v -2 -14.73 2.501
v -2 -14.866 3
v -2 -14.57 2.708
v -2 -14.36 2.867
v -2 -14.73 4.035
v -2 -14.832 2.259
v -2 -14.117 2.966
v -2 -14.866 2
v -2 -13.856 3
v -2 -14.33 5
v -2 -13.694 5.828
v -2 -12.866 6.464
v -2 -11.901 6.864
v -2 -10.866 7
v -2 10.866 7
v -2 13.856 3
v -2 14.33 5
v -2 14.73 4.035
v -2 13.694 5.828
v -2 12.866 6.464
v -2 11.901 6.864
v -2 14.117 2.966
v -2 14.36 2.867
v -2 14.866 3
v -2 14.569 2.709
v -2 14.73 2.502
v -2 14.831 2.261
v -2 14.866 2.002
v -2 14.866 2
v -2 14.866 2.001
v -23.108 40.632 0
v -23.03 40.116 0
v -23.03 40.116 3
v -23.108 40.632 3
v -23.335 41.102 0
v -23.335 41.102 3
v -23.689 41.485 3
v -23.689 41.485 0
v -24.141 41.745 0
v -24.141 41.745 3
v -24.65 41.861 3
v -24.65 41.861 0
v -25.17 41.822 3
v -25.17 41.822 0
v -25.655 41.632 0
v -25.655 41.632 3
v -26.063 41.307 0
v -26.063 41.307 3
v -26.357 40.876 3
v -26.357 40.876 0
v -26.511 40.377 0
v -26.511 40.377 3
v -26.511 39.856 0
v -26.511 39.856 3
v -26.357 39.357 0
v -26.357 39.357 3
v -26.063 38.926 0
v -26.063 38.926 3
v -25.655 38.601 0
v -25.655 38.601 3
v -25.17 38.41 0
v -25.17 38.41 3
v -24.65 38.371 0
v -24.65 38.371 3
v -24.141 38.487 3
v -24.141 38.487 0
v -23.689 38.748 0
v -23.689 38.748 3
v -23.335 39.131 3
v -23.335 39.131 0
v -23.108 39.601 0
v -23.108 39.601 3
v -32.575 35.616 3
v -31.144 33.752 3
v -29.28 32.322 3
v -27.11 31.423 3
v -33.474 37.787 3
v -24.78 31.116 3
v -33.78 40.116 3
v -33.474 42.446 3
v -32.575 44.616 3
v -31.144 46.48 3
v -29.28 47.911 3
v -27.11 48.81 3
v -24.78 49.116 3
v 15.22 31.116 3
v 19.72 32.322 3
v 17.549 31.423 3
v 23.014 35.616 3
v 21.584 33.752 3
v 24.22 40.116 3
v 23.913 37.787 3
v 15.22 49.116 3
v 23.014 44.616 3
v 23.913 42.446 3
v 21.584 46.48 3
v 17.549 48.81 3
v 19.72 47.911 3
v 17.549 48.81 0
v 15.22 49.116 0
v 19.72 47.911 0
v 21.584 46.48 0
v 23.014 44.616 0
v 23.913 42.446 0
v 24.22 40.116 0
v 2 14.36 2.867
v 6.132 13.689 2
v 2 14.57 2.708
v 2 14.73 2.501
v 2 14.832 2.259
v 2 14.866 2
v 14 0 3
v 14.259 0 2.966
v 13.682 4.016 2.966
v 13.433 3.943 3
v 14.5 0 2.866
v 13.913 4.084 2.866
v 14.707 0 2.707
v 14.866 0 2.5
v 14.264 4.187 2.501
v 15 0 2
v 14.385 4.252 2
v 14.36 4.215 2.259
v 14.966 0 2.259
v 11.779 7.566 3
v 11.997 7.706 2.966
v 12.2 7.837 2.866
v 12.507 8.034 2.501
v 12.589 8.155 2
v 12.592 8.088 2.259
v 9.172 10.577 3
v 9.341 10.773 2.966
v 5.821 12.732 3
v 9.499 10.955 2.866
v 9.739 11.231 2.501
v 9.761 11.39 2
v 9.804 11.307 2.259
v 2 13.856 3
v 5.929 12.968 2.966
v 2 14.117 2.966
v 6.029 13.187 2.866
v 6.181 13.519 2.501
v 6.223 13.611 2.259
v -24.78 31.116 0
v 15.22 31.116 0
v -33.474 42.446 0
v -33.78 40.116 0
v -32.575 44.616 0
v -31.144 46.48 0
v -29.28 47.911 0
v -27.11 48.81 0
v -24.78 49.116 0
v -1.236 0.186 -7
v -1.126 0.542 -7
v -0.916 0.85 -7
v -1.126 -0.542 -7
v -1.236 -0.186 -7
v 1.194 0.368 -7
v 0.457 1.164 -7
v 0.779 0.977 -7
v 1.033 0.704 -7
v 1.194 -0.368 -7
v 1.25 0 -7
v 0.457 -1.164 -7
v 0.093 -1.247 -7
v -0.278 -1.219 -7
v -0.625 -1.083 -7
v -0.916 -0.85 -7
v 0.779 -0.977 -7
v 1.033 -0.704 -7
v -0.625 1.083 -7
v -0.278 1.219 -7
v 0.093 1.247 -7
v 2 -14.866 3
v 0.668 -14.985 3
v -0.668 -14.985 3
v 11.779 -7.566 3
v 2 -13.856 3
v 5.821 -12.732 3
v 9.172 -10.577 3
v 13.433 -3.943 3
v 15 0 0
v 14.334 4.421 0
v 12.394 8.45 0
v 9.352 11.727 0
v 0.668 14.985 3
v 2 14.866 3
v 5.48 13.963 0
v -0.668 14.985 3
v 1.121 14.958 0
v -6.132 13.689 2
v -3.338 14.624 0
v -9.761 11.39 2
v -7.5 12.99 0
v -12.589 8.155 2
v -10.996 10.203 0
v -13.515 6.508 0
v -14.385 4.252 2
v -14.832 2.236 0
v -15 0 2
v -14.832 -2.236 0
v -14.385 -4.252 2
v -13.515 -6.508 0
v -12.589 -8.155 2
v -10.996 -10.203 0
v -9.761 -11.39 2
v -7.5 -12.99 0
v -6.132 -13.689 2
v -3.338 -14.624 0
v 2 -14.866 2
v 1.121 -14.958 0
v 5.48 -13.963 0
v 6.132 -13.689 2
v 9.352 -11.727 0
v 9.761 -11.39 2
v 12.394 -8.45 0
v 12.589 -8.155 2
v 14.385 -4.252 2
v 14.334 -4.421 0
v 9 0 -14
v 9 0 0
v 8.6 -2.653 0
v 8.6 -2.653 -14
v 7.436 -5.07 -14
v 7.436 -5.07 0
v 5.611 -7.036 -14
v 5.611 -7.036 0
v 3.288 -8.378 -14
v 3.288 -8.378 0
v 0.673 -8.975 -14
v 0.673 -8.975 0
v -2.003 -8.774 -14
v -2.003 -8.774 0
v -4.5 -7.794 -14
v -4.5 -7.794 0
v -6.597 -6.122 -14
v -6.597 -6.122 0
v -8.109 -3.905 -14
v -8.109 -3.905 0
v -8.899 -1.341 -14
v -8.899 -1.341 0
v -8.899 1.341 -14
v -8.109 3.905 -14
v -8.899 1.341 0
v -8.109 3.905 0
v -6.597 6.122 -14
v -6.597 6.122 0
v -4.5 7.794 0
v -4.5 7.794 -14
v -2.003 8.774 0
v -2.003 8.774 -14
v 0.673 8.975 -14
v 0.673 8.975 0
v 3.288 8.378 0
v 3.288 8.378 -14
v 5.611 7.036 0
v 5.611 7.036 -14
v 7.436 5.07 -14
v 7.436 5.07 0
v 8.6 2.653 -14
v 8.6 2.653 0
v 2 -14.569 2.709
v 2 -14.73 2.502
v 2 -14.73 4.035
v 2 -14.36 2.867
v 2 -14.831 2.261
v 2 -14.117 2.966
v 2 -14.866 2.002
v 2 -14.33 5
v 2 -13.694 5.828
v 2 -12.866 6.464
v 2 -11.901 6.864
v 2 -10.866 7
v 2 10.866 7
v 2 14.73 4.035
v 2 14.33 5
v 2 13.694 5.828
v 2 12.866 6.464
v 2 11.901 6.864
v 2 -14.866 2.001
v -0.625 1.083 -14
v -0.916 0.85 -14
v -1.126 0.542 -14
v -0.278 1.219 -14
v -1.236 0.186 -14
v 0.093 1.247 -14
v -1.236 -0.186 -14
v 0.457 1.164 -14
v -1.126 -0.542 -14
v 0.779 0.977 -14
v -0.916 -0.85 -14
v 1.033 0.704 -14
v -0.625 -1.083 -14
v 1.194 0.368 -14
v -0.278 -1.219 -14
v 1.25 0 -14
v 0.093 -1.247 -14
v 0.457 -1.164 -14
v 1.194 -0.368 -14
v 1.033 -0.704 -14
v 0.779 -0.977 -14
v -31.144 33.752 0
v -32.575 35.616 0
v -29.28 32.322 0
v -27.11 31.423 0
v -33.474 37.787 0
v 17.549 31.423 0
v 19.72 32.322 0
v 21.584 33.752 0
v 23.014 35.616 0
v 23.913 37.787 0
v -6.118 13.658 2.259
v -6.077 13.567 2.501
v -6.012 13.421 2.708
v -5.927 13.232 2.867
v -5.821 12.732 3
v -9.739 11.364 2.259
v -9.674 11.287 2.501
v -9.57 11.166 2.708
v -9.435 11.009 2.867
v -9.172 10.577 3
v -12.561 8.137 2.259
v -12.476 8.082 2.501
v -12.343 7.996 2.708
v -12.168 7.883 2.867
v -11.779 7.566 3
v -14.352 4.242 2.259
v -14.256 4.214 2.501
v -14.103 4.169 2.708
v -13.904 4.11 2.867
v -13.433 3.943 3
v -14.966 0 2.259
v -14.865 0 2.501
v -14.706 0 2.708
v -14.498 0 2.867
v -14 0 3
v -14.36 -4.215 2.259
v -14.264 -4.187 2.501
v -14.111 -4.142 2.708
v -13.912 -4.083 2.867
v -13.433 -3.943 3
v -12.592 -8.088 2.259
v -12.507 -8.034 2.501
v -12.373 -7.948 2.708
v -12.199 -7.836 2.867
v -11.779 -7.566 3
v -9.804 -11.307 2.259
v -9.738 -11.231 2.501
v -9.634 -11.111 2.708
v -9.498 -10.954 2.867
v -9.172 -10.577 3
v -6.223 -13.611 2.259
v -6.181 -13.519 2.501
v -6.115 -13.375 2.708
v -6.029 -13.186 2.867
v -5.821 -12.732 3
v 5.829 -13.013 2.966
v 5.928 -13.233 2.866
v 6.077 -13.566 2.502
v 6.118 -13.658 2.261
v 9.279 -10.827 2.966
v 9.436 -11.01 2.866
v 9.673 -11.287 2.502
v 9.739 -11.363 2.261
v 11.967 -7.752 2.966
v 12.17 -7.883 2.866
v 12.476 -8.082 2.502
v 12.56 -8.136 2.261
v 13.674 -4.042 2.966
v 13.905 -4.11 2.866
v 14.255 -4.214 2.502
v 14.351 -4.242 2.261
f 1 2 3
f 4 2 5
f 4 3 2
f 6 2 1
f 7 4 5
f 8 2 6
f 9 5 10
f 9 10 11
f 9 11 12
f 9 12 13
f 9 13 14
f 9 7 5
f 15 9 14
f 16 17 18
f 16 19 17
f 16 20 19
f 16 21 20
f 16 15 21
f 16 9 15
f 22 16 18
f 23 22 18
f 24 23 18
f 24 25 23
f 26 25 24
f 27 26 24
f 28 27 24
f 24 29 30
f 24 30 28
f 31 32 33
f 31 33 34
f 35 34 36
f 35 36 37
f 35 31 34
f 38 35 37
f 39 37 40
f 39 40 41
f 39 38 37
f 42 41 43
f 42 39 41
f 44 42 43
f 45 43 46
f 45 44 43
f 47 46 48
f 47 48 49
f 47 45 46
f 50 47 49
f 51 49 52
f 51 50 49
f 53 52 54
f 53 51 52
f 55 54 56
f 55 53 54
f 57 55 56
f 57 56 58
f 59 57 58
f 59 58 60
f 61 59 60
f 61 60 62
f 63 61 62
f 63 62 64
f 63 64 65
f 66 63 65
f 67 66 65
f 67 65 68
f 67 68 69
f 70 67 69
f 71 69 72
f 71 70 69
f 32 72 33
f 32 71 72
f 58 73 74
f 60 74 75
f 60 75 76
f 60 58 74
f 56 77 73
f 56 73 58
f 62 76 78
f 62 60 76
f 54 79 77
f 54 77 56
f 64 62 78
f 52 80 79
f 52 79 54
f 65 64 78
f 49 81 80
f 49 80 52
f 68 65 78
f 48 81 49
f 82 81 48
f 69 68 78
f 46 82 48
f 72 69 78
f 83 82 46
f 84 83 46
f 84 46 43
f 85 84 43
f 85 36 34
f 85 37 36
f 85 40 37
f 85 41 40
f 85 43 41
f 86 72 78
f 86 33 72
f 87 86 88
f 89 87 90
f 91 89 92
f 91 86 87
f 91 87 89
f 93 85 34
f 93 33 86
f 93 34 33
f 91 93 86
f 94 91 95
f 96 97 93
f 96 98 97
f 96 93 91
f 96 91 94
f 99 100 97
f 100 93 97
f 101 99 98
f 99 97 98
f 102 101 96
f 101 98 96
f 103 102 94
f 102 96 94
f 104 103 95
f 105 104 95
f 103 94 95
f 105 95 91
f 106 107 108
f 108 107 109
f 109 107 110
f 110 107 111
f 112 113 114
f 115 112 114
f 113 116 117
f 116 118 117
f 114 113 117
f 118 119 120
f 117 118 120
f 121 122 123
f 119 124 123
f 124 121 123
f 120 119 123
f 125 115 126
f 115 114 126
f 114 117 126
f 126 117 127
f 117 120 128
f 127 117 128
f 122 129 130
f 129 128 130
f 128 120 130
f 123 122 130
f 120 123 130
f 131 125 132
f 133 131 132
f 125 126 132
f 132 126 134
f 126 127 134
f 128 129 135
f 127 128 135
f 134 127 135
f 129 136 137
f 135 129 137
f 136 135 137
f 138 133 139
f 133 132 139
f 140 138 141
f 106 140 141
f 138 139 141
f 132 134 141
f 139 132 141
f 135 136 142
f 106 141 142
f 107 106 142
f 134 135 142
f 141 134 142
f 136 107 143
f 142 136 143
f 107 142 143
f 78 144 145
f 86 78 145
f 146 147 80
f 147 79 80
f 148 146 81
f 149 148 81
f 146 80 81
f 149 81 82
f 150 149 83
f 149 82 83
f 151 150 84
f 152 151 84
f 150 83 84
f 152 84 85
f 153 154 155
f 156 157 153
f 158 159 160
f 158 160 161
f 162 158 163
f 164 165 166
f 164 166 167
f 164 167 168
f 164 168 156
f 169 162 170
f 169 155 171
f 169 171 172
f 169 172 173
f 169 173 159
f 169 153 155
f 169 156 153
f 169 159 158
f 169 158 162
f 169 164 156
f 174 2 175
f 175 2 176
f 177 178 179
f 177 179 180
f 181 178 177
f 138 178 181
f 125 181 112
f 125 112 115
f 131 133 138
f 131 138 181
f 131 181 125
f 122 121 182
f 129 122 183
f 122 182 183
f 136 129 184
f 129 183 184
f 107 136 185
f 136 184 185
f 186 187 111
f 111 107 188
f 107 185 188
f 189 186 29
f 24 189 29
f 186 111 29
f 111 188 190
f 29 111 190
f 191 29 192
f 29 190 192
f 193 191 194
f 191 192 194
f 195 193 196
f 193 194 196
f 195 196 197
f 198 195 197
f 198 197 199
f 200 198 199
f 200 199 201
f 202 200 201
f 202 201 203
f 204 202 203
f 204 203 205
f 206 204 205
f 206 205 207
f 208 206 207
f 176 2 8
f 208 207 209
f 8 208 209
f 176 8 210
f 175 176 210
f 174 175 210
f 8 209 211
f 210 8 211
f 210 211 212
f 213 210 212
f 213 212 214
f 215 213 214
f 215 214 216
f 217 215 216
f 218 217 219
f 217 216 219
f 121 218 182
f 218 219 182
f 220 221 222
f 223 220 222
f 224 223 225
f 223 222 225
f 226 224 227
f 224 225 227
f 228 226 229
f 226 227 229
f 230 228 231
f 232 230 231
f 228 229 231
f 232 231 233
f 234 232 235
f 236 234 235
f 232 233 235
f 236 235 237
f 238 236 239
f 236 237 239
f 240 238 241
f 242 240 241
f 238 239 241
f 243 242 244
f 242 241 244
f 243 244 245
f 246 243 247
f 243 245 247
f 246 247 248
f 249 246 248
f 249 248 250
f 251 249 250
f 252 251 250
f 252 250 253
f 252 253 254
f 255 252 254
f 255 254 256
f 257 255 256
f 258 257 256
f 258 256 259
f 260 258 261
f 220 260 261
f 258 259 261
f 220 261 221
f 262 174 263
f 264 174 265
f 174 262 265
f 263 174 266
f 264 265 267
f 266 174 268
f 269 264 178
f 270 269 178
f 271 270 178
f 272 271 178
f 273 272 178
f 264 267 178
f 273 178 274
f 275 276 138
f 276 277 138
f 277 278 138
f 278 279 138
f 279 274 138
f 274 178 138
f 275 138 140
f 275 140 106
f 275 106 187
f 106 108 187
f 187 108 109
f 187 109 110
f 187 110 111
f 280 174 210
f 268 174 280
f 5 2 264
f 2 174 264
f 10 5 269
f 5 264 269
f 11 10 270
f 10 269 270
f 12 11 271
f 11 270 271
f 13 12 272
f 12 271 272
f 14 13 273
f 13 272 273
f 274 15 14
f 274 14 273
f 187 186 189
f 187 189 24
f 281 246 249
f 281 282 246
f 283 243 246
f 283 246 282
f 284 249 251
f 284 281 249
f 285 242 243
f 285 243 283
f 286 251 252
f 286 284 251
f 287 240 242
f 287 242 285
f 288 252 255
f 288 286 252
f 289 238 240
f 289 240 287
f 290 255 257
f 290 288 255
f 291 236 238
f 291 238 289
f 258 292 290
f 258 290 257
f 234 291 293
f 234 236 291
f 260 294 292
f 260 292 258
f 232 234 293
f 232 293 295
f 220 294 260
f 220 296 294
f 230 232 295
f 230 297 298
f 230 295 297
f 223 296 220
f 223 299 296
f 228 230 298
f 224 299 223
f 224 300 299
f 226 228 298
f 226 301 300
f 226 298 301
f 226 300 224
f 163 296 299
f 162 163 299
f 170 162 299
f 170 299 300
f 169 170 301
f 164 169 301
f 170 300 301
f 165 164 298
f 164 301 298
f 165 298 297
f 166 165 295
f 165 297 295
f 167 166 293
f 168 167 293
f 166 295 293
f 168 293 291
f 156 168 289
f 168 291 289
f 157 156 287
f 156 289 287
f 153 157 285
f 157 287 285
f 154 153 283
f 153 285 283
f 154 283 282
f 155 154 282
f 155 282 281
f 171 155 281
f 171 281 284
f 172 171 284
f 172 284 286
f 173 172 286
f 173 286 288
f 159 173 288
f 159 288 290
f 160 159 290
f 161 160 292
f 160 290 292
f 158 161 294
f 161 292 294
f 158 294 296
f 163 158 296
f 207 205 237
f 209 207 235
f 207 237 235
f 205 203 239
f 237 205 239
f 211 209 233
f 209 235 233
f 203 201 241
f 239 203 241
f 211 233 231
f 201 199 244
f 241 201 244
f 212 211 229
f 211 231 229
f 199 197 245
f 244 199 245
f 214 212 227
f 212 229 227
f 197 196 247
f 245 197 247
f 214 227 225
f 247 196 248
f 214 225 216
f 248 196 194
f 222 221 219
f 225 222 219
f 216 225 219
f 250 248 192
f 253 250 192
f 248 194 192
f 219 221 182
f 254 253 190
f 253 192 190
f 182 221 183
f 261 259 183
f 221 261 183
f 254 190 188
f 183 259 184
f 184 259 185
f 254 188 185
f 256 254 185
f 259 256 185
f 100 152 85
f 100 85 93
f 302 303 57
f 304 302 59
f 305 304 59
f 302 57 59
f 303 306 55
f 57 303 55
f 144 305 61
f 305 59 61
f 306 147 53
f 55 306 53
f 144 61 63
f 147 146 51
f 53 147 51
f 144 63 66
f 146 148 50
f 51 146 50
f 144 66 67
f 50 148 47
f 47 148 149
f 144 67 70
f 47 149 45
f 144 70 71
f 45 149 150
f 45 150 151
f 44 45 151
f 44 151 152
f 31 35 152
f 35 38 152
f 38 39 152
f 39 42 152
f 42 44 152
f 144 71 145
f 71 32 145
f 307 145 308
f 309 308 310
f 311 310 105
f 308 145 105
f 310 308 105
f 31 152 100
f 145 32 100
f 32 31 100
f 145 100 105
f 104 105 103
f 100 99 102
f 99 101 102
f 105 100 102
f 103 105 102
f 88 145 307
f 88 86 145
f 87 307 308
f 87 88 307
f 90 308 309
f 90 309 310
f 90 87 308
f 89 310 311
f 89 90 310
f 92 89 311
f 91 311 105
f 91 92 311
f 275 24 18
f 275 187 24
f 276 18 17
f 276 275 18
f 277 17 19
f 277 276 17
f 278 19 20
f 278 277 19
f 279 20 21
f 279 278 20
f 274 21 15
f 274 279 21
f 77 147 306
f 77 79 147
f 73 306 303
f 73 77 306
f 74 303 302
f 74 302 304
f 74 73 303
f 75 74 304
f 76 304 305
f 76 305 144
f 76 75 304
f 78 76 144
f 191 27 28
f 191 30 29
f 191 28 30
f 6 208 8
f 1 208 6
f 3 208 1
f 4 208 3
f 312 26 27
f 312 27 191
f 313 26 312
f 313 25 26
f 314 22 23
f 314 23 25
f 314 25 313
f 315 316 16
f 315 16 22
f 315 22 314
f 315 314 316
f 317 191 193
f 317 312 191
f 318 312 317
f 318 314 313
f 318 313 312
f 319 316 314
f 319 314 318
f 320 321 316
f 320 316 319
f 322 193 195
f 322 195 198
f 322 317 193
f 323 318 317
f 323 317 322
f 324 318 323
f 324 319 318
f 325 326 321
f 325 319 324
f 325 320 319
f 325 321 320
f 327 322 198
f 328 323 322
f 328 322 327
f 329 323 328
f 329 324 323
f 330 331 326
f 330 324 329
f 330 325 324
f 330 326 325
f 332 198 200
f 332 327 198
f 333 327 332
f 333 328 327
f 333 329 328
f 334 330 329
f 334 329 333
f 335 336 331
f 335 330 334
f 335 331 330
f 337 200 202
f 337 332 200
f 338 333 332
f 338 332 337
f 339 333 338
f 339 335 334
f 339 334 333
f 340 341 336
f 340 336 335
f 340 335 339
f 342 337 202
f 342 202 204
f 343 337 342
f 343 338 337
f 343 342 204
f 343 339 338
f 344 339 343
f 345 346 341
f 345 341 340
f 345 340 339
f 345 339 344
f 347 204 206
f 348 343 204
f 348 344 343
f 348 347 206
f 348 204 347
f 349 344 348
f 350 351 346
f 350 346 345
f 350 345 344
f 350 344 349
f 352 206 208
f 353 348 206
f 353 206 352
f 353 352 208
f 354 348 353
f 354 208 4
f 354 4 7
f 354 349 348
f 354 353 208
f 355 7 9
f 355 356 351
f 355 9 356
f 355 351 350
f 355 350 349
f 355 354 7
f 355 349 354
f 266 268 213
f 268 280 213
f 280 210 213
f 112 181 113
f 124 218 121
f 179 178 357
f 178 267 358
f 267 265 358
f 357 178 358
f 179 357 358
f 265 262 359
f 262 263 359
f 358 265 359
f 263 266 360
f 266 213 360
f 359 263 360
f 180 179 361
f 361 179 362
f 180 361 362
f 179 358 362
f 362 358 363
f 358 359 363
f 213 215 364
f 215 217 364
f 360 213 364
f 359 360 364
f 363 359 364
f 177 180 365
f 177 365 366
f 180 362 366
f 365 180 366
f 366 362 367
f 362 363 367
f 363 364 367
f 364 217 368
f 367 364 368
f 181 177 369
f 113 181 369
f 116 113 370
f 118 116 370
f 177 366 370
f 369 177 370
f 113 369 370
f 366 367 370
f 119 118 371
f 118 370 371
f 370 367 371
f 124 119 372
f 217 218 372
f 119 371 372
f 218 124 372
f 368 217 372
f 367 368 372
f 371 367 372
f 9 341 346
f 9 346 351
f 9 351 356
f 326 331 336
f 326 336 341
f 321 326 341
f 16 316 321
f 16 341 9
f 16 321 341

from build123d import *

# Parameters (mm, degrees)
F0_R         = 15
F1_DEPTH     = 3
F2_R         = 9
F3_DEPTH     = 14
F4_W         = 4
F4_H         = 29.7321374946
F5_DEPTH     = 4
F6_R         = 3.99999
F7_T4_ANGLE  = 164.6754886785
F7_T9_ANGLE  = 82.3377443392
F7_T14_ANGLE = 82.3377443392
F8_R         = 1.25
F9_DEPTH     = 7
F10_W        = 58
F10_H        = 18
F10_R        = 1.75
F11_DEPTH    = 3
F12_R        = 8.99999


# Not quite as in the source:
# - a fillet or chamfer that OpenCascade refuses, or shapes differently, is made with other operations: its cross-section is extruded or revolved along the edge and cut away or added
# - a fillet or chamfer is up to 0.001 mm smaller than in the source, because OpenCascade refuses the exact size


with BuildPart() as f1:
    # F0 (on Top) → F1 (new body)
    with BuildSketch(Plane.XY):
        Circle(F0_R)
    extrude(amount=F1_DEPTH)

    # F2 (on face) → F3 (join)
    with BuildSketch(Plane(origin=(0, 0, 0), x_dir=(1, 0, 0), z_dir=(0, 0, -1))):
        Circle(F2_R)
    extrude(amount=F3_DEPTH)

    # F4 (on face) → F5 (join)
    with BuildSketch(Plane.XY.offset(3)):
        Rectangle(F4_W, F4_H)
    extrude(amount=F5_DEPTH)

    # F6 (radius 4 in the source; OpenCascade refuses exactly that, so slightly less here)
    f6_edges = [f1.edges().sort_by_distance(p)[0] for p in [
        (0, 14.866069, 7),
        (0, -14.866069, 7),
    ]]
    fillet(f6_edges, radius=F6_R)

    # F7: fillet of radius 1 on 3 edges, made by hand


with BuildPart() as f7_tool2:
    # F7_s3 → F7_t4 (revolve)
    with BuildSketch(Plane(origin=(0, 0, 0), x_dir=(0, 0, 1), z_dir=(0.9910712498, 0.1333333333, 0))):
        with BuildLine():
            ThreePointArc((2, -15), (2.7071067812, -14.7071067812), (3, -14))
            Line((3, -14), (3, -15))
            Line((3, -15), (2, -15))
        make_face()
    revolve(axis=Axis((0, 0, 3), (0, 0, 1)), revolution_arc=F7_T4_ANGLE)

    split(bisect_by=Plane.YZ.offset(-2), keep=Keep.BOTTOM)


with BuildPart() as f1_1:
    add(f1.part)

    # F7_t1: cut F7_tool2
    add(f7_tool2.part, mode=Mode.SUBTRACT)


with BuildPart() as f7_tool7:
    # F7_s8 → F7_t9 (revolve)
    with BuildSketch(Plane(origin=(0, 0, 0), x_dir=(0, 0, 1), z_dir=(-0.9910712498, -0.1333333333, 0))):
        with BuildLine():
            ThreePointArc((3, -14), (2.7071067812, -14.7071067812), (2, -15))
            Line((2, -15), (3, -15))
            Line((3, -15), (3, -14))
        make_face()
    revolve(axis=Axis((0, 0, 3), (0, 0, 1)), revolution_arc=F7_T9_ANGLE)

    split(bisect_by=Plane.YZ.offset(2), keep=Keep.TOP)


with BuildPart() as f1_2:
    add(f1_1.part)

    # F7_t6: cut F7_tool7
    add(f7_tool7.part, mode=Mode.SUBTRACT)


with BuildPart() as f7_tool12:
    # F7_s13 → F7_t14 (revolve)
    with BuildSketch(Plane.XZ):
        with BuildLine():
            ThreePointArc((14, 3), (14.7071067812, 2.7071067812), (15, 2))
            Line((15, 2), (15, 3))
            Line((15, 3), (14, 3))
        make_face()
    revolve(axis=Axis((0, 0, 3), (0, 0, 1)), revolution_arc=F7_T14_ANGLE)

    split(bisect_by=Plane.YZ.offset(2), keep=Keep.TOP)


with BuildPart() as f1_3:
    add(f1_2.part)

    # F7_t11: cut F7_tool12
    add(f7_tool12.part, mode=Mode.SUBTRACT)

    # F8 (on face) → F9 (cut)
    with BuildSketch(Plane(origin=(0, 0, -14), x_dir=(1, 0, 0), z_dir=(0, 0, -1))):
        Circle(F8_R)
    extrude(amount=-F9_DEPTH, mode=Mode.SUBTRACT)


with BuildPart() as f11:
    # F10 (on Top) → F11 (new body)
    with BuildSketch(Plane.XY):
        with Locations((-4.7804481387, 40.116373837)):
            Rectangle(F10_W, F10_H)
        with Locations((-24.7804481387, 40.116373837)):
            Circle(F10_R, mode=Mode.SUBTRACT)
    extrude(amount=F11_DEPTH)

    # F12 (radius 9 in the source; OpenCascade refuses exactly that, so slightly less here)
    f12_edges = [f11.edges().sort_by_distance(p)[0] for p in [
        (-33.780448, 49.116374, 1.5),
        (-33.780448, 31.116374, 1.5),
        (24.219552, 49.116374, 1.5),
        (24.219552, 31.116374, 1.5),
    ]]
    fillet(f12_edges, radius=F12_R)


solid = Compound([f1_3.part, f11.part])
